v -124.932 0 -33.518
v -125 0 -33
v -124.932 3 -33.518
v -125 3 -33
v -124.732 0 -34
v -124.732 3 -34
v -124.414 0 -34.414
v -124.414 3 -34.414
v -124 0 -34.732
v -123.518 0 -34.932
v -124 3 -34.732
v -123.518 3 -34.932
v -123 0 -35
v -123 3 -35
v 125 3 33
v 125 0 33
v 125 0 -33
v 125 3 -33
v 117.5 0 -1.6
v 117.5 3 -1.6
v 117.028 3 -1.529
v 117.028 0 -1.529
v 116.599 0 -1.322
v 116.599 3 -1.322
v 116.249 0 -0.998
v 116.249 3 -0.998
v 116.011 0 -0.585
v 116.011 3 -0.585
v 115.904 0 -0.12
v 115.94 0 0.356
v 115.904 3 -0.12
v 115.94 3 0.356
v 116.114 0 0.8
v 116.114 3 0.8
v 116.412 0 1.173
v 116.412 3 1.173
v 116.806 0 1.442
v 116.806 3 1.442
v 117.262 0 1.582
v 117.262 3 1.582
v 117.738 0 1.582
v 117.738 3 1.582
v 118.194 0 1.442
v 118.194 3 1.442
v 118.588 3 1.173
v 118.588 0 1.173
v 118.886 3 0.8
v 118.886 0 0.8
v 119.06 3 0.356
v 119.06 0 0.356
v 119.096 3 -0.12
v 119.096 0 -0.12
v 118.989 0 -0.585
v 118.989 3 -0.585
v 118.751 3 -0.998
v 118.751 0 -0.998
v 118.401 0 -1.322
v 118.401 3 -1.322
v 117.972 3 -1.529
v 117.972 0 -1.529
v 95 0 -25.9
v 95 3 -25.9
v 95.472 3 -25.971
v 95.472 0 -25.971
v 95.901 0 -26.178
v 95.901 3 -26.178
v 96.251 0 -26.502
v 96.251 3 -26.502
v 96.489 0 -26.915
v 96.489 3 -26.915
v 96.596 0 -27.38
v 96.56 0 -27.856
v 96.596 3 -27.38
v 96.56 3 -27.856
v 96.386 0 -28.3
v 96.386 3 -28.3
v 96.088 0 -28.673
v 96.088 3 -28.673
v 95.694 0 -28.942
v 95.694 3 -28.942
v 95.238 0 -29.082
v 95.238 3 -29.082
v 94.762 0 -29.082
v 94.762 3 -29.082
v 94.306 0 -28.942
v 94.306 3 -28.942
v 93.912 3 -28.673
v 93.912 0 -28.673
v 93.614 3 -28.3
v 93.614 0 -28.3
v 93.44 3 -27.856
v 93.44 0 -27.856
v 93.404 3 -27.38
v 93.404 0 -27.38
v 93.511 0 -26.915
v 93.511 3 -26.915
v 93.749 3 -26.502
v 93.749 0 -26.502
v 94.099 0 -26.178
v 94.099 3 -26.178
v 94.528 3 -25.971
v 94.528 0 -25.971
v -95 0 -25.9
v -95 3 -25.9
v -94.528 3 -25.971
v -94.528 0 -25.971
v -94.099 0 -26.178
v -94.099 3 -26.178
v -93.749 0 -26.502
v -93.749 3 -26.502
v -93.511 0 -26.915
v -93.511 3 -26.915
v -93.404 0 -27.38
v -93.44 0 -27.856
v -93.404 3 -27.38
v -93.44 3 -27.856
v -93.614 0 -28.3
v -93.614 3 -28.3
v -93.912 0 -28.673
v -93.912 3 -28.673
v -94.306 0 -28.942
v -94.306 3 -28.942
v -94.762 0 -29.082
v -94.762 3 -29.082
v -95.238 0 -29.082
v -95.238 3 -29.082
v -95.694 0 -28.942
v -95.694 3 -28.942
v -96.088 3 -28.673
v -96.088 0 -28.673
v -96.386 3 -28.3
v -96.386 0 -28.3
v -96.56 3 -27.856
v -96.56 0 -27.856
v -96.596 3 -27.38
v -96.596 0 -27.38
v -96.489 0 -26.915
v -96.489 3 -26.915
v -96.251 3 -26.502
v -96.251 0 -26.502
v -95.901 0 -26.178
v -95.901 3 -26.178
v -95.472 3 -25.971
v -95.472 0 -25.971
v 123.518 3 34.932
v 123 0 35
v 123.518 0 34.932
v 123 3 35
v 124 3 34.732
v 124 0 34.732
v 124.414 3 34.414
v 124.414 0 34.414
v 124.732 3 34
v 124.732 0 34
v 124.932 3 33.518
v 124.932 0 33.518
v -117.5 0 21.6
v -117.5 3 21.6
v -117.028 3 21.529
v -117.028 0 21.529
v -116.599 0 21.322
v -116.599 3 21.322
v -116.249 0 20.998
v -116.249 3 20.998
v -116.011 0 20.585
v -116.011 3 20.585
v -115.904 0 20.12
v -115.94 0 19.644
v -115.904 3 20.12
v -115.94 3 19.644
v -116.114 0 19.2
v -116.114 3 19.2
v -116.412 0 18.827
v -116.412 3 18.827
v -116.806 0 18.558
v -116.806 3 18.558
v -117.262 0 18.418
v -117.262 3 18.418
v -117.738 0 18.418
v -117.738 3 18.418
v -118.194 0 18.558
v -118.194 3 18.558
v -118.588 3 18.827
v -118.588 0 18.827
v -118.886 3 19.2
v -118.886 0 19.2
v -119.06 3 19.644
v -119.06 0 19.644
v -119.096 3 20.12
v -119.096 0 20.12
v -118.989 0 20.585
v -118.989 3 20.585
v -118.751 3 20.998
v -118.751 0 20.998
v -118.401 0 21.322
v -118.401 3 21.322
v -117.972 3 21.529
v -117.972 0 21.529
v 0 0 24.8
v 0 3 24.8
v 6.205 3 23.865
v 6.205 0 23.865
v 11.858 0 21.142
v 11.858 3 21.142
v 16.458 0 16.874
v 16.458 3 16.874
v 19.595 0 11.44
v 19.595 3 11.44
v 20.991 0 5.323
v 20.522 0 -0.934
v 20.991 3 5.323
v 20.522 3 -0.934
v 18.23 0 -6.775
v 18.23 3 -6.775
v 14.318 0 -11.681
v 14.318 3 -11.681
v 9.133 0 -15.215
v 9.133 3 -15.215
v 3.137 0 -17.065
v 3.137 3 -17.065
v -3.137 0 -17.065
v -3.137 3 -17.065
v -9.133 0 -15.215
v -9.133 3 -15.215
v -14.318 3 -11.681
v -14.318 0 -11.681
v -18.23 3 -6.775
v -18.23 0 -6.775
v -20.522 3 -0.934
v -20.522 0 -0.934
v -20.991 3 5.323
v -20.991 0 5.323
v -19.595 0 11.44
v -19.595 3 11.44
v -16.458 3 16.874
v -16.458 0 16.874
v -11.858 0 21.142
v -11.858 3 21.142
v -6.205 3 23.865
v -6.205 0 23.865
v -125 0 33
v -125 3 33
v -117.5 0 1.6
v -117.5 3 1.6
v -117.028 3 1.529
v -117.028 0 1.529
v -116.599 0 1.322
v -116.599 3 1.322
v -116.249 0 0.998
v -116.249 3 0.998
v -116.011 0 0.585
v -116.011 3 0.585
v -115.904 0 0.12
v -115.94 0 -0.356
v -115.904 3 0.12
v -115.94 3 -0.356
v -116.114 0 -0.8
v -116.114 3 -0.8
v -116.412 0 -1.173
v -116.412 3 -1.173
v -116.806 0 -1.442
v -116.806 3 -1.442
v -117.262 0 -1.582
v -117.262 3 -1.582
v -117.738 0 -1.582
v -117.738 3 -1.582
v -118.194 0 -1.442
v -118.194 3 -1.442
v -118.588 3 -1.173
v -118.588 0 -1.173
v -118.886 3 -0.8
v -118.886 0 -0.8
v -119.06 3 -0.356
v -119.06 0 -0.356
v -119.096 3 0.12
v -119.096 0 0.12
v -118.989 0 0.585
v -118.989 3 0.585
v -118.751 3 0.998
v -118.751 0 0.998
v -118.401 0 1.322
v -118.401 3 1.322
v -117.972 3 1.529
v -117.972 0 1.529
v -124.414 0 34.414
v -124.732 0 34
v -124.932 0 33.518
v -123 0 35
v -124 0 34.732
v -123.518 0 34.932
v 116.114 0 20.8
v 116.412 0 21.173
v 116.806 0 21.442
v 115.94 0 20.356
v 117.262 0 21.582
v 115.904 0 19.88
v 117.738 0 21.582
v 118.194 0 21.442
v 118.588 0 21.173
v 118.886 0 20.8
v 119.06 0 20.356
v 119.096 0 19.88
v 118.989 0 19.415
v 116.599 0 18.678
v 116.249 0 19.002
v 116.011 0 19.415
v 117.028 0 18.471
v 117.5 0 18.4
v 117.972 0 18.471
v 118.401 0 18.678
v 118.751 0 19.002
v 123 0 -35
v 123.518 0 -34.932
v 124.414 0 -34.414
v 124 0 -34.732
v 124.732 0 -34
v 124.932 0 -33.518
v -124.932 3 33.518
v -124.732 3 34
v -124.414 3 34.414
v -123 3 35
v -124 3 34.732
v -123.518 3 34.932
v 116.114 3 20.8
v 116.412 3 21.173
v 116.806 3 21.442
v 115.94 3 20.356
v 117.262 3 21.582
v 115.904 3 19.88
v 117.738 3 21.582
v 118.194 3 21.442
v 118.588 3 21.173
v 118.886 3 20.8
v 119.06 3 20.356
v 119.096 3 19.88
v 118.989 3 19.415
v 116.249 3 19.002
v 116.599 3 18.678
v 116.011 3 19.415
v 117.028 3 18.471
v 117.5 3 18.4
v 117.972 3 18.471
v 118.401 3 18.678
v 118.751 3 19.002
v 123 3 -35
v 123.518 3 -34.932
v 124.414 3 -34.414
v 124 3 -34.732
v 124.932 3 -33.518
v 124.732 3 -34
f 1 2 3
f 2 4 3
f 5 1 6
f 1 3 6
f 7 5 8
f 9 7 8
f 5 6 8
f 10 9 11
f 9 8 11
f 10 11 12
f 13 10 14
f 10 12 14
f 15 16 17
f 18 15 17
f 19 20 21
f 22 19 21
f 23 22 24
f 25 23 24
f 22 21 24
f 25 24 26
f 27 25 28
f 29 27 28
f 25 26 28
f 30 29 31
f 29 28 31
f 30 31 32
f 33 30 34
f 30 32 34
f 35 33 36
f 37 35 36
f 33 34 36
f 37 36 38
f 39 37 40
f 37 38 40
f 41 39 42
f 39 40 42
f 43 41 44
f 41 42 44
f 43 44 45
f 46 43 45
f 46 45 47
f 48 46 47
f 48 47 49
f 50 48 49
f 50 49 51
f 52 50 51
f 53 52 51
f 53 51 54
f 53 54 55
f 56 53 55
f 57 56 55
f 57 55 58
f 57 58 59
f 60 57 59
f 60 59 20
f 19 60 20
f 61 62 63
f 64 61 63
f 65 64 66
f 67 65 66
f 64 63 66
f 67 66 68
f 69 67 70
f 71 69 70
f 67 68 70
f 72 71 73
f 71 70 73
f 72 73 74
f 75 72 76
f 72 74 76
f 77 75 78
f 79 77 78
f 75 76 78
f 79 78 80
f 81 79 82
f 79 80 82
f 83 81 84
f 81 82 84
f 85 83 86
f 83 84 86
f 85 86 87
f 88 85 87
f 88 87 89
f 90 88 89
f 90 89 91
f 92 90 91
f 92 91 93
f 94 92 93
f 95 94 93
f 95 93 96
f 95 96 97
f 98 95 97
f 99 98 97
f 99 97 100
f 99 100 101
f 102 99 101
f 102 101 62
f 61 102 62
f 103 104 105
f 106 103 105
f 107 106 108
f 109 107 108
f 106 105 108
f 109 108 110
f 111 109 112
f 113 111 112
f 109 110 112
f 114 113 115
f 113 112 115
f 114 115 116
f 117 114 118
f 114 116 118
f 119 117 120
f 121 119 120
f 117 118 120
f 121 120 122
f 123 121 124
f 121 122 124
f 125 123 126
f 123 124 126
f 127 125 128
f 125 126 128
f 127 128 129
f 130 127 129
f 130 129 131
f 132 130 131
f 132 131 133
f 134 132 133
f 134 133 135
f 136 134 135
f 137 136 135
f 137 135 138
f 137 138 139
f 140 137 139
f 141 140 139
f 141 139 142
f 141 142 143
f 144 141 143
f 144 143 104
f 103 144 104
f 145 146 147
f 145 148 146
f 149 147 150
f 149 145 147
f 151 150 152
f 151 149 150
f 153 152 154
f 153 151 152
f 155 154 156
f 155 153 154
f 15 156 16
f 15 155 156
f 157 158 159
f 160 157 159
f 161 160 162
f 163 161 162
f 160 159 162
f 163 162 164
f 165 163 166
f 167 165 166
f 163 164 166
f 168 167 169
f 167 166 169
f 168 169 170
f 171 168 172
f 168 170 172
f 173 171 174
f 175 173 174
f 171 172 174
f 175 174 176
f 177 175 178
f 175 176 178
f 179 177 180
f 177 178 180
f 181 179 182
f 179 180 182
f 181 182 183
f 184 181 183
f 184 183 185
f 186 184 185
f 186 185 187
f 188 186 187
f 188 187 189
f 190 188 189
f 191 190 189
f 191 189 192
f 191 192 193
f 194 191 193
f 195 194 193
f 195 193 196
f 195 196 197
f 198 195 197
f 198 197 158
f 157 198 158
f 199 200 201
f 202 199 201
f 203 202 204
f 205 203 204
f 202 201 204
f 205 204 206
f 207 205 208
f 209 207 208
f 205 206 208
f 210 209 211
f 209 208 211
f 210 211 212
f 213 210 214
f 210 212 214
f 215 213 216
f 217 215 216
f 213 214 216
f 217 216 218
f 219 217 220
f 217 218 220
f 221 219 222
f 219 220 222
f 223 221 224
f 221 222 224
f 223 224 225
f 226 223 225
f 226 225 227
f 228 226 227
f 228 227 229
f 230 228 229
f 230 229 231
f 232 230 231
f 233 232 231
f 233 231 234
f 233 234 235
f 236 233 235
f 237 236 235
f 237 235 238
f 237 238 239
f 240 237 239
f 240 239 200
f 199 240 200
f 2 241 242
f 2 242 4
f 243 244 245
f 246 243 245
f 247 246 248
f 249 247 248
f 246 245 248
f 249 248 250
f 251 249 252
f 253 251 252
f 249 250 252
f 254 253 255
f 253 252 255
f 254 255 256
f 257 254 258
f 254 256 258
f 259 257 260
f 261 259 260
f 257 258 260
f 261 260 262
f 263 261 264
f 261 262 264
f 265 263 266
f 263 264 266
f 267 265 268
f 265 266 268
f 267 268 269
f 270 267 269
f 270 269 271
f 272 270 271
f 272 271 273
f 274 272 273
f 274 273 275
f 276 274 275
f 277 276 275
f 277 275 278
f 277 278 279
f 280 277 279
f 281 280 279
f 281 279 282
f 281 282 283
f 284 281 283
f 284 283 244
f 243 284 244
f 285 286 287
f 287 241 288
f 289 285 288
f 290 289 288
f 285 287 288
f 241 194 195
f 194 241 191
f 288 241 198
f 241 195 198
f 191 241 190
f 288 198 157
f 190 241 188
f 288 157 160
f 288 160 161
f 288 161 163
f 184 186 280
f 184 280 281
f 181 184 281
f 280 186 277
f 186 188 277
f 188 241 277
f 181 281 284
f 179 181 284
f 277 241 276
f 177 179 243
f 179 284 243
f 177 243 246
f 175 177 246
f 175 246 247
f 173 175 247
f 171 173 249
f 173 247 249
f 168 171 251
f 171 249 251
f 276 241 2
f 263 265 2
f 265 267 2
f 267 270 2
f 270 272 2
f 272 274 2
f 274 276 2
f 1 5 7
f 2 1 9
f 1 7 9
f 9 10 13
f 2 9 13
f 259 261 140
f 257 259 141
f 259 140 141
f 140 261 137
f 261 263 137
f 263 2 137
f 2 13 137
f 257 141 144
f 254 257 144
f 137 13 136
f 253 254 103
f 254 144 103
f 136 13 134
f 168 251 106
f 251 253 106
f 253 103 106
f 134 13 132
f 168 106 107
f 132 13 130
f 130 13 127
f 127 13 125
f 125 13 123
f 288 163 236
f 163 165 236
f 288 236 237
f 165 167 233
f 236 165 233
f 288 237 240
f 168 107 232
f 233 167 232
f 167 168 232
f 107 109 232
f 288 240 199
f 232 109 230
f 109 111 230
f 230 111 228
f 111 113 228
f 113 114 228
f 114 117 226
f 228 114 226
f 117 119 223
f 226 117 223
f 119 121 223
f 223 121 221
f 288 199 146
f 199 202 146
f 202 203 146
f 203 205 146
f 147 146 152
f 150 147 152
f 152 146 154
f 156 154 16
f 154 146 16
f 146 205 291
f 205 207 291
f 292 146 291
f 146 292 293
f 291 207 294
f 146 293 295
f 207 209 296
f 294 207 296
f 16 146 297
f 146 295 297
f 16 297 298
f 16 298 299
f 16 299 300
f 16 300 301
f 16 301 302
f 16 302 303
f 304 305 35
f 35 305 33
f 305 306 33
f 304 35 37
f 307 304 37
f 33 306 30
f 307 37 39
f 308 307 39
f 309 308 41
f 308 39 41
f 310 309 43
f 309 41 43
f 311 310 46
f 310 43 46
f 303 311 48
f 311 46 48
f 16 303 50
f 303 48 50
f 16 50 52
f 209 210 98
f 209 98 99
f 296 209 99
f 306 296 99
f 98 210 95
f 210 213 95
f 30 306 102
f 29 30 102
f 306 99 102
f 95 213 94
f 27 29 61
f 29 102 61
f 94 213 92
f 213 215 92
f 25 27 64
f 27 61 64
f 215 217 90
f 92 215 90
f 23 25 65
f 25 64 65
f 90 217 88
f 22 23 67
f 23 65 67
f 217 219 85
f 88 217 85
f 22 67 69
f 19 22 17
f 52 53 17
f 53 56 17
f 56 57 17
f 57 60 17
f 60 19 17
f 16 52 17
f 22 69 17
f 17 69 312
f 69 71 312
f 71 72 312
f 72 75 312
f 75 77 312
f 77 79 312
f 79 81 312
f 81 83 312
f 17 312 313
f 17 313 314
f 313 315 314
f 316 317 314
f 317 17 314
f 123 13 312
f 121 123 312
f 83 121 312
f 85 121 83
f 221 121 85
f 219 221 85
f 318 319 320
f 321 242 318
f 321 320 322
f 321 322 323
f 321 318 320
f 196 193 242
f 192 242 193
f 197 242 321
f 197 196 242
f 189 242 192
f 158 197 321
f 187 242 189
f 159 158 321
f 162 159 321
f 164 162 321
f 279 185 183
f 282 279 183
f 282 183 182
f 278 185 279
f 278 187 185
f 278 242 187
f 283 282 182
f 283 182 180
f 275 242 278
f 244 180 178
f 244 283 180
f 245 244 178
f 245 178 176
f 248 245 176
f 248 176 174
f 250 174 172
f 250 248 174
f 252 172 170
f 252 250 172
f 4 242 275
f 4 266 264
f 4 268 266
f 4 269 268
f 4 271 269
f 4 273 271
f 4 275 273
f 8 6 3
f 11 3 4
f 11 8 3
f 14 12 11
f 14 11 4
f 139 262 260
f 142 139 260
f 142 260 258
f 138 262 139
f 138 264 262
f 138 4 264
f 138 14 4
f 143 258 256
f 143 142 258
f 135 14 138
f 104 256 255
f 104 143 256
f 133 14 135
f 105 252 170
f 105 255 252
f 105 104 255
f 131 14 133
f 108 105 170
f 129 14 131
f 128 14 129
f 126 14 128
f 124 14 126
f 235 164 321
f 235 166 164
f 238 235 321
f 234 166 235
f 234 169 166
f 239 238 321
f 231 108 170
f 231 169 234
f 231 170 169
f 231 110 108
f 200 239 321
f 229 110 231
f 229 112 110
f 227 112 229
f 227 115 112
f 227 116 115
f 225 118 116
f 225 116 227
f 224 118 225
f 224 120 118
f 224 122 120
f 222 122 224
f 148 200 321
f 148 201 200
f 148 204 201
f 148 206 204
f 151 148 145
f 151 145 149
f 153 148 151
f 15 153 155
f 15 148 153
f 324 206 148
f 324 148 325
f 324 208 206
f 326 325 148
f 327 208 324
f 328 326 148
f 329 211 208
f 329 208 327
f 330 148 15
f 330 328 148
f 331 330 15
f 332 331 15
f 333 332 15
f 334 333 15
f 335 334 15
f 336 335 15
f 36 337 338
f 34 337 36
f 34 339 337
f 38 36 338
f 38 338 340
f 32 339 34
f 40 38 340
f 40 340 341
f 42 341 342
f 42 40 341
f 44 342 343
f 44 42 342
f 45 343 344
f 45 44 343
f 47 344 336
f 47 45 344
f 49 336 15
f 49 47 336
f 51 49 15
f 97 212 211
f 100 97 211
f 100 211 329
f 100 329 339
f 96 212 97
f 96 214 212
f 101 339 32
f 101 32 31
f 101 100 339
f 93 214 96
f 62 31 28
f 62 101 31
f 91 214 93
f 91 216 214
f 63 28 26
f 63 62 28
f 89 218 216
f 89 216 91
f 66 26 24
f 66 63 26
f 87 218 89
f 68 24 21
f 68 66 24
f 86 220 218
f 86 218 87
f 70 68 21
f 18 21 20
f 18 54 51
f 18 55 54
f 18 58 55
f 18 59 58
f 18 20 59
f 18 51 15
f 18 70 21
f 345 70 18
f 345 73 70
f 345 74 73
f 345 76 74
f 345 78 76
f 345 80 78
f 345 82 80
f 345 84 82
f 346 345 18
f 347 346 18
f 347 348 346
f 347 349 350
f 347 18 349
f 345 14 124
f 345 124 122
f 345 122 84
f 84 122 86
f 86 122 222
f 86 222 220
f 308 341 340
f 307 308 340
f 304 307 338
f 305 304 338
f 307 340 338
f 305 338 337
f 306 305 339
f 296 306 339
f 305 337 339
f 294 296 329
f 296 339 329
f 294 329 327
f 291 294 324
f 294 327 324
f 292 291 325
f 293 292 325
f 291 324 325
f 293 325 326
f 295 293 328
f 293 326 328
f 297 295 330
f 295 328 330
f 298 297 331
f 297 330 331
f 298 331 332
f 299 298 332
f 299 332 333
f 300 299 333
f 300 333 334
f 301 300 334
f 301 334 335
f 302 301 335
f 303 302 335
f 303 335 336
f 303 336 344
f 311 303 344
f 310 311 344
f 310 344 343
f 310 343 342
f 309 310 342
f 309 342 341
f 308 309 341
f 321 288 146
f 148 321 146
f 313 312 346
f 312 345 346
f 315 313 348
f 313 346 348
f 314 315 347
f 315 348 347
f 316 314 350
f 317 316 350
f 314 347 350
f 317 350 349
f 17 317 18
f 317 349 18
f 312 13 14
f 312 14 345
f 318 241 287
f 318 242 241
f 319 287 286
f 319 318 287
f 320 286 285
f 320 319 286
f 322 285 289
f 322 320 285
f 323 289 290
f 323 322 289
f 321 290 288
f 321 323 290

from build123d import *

# Parameters (mm, degrees)
SKETCH_1_W          = 250
SKETCH_1_H          = 70
EXTRUDE_1_DEPTH     = 3
SKETCH_2_R          = 1.6
CUT_EXTRUDE_1_DEPTH = 130.842211934
FILLET_2_R          = 2
SKETCH_3_R          = 21.05
CUT_EXTRUDE_2_DEPTH = 130.842211934


with BuildPart() as part:
    # 草图1 → 凸台-拉伸1 (new body)
    with BuildSketch(Plane(origin=(0, 0, 0), x_dir=(1, 0, 0), z_dir=(0, 1, 0))):
        Rectangle(SKETCH_1_W, SKETCH_1_H)
    extrude(amount=EXTRUDE_1_DEPTH)

    # 草图2 → 切除-拉伸1 (cut, through all)
    with BuildSketch(Plane(origin=(0, 3, 0), x_dir=(1, 0, 0), z_dir=(0, 1, 0))):
        with Locations(Location((-95, 27.5, 0), (0, 0, 270))):
            Circle(SKETCH_2_R)
        with Locations(Location((95, 27.5, 0), (0, 0, 270))):
            Circle(SKETCH_2_R)
        with Locations(Location((-117.5, 0, 0), (0, 0, 270))):
            Circle(SKETCH_2_R)
        with Locations(Location((-117.5, -20, 0), (0, 0, 270))):
            Circle(SKETCH_2_R)
        with Locations(Location((117.5, -20, 0), (0, 0, 90))):
            Circle(SKETCH_2_R)
        with Locations(Location((117.5, 0, 0), (0, 0, 90))):
            Circle(SKETCH_2_R)
    extrude(amount=-CUT_EXTRUDE_1_DEPTH, mode=Mode.SUBTRACT)

    # 圆角2
    fillet_2_edges = [part.edges().sort_by_distance(p)[0] for p in [
        (125, 1.5, 35),
        (-125, 1.5, 35),
        (-125, 1.5, -35),
        (125, 1.5, -35),
    ]]
    fillet(fillet_2_edges, radius=FILLET_2_R)

    # 草图3 → 切除-拉伸2 (cut, through all)
    with BuildSketch(Plane(origin=(0, 3, 0), x_dir=(1, 0, 0), z_dir=(0, 1, 0))):
        with Locations(Location((0, -3.75, 0), (0, 0, 270))):
            Circle(SKETCH_3_R)
    extrude(amount=-CUT_EXTRUDE_2_DEPTH, mode=Mode.SUBTRACT)


solid = part.part
